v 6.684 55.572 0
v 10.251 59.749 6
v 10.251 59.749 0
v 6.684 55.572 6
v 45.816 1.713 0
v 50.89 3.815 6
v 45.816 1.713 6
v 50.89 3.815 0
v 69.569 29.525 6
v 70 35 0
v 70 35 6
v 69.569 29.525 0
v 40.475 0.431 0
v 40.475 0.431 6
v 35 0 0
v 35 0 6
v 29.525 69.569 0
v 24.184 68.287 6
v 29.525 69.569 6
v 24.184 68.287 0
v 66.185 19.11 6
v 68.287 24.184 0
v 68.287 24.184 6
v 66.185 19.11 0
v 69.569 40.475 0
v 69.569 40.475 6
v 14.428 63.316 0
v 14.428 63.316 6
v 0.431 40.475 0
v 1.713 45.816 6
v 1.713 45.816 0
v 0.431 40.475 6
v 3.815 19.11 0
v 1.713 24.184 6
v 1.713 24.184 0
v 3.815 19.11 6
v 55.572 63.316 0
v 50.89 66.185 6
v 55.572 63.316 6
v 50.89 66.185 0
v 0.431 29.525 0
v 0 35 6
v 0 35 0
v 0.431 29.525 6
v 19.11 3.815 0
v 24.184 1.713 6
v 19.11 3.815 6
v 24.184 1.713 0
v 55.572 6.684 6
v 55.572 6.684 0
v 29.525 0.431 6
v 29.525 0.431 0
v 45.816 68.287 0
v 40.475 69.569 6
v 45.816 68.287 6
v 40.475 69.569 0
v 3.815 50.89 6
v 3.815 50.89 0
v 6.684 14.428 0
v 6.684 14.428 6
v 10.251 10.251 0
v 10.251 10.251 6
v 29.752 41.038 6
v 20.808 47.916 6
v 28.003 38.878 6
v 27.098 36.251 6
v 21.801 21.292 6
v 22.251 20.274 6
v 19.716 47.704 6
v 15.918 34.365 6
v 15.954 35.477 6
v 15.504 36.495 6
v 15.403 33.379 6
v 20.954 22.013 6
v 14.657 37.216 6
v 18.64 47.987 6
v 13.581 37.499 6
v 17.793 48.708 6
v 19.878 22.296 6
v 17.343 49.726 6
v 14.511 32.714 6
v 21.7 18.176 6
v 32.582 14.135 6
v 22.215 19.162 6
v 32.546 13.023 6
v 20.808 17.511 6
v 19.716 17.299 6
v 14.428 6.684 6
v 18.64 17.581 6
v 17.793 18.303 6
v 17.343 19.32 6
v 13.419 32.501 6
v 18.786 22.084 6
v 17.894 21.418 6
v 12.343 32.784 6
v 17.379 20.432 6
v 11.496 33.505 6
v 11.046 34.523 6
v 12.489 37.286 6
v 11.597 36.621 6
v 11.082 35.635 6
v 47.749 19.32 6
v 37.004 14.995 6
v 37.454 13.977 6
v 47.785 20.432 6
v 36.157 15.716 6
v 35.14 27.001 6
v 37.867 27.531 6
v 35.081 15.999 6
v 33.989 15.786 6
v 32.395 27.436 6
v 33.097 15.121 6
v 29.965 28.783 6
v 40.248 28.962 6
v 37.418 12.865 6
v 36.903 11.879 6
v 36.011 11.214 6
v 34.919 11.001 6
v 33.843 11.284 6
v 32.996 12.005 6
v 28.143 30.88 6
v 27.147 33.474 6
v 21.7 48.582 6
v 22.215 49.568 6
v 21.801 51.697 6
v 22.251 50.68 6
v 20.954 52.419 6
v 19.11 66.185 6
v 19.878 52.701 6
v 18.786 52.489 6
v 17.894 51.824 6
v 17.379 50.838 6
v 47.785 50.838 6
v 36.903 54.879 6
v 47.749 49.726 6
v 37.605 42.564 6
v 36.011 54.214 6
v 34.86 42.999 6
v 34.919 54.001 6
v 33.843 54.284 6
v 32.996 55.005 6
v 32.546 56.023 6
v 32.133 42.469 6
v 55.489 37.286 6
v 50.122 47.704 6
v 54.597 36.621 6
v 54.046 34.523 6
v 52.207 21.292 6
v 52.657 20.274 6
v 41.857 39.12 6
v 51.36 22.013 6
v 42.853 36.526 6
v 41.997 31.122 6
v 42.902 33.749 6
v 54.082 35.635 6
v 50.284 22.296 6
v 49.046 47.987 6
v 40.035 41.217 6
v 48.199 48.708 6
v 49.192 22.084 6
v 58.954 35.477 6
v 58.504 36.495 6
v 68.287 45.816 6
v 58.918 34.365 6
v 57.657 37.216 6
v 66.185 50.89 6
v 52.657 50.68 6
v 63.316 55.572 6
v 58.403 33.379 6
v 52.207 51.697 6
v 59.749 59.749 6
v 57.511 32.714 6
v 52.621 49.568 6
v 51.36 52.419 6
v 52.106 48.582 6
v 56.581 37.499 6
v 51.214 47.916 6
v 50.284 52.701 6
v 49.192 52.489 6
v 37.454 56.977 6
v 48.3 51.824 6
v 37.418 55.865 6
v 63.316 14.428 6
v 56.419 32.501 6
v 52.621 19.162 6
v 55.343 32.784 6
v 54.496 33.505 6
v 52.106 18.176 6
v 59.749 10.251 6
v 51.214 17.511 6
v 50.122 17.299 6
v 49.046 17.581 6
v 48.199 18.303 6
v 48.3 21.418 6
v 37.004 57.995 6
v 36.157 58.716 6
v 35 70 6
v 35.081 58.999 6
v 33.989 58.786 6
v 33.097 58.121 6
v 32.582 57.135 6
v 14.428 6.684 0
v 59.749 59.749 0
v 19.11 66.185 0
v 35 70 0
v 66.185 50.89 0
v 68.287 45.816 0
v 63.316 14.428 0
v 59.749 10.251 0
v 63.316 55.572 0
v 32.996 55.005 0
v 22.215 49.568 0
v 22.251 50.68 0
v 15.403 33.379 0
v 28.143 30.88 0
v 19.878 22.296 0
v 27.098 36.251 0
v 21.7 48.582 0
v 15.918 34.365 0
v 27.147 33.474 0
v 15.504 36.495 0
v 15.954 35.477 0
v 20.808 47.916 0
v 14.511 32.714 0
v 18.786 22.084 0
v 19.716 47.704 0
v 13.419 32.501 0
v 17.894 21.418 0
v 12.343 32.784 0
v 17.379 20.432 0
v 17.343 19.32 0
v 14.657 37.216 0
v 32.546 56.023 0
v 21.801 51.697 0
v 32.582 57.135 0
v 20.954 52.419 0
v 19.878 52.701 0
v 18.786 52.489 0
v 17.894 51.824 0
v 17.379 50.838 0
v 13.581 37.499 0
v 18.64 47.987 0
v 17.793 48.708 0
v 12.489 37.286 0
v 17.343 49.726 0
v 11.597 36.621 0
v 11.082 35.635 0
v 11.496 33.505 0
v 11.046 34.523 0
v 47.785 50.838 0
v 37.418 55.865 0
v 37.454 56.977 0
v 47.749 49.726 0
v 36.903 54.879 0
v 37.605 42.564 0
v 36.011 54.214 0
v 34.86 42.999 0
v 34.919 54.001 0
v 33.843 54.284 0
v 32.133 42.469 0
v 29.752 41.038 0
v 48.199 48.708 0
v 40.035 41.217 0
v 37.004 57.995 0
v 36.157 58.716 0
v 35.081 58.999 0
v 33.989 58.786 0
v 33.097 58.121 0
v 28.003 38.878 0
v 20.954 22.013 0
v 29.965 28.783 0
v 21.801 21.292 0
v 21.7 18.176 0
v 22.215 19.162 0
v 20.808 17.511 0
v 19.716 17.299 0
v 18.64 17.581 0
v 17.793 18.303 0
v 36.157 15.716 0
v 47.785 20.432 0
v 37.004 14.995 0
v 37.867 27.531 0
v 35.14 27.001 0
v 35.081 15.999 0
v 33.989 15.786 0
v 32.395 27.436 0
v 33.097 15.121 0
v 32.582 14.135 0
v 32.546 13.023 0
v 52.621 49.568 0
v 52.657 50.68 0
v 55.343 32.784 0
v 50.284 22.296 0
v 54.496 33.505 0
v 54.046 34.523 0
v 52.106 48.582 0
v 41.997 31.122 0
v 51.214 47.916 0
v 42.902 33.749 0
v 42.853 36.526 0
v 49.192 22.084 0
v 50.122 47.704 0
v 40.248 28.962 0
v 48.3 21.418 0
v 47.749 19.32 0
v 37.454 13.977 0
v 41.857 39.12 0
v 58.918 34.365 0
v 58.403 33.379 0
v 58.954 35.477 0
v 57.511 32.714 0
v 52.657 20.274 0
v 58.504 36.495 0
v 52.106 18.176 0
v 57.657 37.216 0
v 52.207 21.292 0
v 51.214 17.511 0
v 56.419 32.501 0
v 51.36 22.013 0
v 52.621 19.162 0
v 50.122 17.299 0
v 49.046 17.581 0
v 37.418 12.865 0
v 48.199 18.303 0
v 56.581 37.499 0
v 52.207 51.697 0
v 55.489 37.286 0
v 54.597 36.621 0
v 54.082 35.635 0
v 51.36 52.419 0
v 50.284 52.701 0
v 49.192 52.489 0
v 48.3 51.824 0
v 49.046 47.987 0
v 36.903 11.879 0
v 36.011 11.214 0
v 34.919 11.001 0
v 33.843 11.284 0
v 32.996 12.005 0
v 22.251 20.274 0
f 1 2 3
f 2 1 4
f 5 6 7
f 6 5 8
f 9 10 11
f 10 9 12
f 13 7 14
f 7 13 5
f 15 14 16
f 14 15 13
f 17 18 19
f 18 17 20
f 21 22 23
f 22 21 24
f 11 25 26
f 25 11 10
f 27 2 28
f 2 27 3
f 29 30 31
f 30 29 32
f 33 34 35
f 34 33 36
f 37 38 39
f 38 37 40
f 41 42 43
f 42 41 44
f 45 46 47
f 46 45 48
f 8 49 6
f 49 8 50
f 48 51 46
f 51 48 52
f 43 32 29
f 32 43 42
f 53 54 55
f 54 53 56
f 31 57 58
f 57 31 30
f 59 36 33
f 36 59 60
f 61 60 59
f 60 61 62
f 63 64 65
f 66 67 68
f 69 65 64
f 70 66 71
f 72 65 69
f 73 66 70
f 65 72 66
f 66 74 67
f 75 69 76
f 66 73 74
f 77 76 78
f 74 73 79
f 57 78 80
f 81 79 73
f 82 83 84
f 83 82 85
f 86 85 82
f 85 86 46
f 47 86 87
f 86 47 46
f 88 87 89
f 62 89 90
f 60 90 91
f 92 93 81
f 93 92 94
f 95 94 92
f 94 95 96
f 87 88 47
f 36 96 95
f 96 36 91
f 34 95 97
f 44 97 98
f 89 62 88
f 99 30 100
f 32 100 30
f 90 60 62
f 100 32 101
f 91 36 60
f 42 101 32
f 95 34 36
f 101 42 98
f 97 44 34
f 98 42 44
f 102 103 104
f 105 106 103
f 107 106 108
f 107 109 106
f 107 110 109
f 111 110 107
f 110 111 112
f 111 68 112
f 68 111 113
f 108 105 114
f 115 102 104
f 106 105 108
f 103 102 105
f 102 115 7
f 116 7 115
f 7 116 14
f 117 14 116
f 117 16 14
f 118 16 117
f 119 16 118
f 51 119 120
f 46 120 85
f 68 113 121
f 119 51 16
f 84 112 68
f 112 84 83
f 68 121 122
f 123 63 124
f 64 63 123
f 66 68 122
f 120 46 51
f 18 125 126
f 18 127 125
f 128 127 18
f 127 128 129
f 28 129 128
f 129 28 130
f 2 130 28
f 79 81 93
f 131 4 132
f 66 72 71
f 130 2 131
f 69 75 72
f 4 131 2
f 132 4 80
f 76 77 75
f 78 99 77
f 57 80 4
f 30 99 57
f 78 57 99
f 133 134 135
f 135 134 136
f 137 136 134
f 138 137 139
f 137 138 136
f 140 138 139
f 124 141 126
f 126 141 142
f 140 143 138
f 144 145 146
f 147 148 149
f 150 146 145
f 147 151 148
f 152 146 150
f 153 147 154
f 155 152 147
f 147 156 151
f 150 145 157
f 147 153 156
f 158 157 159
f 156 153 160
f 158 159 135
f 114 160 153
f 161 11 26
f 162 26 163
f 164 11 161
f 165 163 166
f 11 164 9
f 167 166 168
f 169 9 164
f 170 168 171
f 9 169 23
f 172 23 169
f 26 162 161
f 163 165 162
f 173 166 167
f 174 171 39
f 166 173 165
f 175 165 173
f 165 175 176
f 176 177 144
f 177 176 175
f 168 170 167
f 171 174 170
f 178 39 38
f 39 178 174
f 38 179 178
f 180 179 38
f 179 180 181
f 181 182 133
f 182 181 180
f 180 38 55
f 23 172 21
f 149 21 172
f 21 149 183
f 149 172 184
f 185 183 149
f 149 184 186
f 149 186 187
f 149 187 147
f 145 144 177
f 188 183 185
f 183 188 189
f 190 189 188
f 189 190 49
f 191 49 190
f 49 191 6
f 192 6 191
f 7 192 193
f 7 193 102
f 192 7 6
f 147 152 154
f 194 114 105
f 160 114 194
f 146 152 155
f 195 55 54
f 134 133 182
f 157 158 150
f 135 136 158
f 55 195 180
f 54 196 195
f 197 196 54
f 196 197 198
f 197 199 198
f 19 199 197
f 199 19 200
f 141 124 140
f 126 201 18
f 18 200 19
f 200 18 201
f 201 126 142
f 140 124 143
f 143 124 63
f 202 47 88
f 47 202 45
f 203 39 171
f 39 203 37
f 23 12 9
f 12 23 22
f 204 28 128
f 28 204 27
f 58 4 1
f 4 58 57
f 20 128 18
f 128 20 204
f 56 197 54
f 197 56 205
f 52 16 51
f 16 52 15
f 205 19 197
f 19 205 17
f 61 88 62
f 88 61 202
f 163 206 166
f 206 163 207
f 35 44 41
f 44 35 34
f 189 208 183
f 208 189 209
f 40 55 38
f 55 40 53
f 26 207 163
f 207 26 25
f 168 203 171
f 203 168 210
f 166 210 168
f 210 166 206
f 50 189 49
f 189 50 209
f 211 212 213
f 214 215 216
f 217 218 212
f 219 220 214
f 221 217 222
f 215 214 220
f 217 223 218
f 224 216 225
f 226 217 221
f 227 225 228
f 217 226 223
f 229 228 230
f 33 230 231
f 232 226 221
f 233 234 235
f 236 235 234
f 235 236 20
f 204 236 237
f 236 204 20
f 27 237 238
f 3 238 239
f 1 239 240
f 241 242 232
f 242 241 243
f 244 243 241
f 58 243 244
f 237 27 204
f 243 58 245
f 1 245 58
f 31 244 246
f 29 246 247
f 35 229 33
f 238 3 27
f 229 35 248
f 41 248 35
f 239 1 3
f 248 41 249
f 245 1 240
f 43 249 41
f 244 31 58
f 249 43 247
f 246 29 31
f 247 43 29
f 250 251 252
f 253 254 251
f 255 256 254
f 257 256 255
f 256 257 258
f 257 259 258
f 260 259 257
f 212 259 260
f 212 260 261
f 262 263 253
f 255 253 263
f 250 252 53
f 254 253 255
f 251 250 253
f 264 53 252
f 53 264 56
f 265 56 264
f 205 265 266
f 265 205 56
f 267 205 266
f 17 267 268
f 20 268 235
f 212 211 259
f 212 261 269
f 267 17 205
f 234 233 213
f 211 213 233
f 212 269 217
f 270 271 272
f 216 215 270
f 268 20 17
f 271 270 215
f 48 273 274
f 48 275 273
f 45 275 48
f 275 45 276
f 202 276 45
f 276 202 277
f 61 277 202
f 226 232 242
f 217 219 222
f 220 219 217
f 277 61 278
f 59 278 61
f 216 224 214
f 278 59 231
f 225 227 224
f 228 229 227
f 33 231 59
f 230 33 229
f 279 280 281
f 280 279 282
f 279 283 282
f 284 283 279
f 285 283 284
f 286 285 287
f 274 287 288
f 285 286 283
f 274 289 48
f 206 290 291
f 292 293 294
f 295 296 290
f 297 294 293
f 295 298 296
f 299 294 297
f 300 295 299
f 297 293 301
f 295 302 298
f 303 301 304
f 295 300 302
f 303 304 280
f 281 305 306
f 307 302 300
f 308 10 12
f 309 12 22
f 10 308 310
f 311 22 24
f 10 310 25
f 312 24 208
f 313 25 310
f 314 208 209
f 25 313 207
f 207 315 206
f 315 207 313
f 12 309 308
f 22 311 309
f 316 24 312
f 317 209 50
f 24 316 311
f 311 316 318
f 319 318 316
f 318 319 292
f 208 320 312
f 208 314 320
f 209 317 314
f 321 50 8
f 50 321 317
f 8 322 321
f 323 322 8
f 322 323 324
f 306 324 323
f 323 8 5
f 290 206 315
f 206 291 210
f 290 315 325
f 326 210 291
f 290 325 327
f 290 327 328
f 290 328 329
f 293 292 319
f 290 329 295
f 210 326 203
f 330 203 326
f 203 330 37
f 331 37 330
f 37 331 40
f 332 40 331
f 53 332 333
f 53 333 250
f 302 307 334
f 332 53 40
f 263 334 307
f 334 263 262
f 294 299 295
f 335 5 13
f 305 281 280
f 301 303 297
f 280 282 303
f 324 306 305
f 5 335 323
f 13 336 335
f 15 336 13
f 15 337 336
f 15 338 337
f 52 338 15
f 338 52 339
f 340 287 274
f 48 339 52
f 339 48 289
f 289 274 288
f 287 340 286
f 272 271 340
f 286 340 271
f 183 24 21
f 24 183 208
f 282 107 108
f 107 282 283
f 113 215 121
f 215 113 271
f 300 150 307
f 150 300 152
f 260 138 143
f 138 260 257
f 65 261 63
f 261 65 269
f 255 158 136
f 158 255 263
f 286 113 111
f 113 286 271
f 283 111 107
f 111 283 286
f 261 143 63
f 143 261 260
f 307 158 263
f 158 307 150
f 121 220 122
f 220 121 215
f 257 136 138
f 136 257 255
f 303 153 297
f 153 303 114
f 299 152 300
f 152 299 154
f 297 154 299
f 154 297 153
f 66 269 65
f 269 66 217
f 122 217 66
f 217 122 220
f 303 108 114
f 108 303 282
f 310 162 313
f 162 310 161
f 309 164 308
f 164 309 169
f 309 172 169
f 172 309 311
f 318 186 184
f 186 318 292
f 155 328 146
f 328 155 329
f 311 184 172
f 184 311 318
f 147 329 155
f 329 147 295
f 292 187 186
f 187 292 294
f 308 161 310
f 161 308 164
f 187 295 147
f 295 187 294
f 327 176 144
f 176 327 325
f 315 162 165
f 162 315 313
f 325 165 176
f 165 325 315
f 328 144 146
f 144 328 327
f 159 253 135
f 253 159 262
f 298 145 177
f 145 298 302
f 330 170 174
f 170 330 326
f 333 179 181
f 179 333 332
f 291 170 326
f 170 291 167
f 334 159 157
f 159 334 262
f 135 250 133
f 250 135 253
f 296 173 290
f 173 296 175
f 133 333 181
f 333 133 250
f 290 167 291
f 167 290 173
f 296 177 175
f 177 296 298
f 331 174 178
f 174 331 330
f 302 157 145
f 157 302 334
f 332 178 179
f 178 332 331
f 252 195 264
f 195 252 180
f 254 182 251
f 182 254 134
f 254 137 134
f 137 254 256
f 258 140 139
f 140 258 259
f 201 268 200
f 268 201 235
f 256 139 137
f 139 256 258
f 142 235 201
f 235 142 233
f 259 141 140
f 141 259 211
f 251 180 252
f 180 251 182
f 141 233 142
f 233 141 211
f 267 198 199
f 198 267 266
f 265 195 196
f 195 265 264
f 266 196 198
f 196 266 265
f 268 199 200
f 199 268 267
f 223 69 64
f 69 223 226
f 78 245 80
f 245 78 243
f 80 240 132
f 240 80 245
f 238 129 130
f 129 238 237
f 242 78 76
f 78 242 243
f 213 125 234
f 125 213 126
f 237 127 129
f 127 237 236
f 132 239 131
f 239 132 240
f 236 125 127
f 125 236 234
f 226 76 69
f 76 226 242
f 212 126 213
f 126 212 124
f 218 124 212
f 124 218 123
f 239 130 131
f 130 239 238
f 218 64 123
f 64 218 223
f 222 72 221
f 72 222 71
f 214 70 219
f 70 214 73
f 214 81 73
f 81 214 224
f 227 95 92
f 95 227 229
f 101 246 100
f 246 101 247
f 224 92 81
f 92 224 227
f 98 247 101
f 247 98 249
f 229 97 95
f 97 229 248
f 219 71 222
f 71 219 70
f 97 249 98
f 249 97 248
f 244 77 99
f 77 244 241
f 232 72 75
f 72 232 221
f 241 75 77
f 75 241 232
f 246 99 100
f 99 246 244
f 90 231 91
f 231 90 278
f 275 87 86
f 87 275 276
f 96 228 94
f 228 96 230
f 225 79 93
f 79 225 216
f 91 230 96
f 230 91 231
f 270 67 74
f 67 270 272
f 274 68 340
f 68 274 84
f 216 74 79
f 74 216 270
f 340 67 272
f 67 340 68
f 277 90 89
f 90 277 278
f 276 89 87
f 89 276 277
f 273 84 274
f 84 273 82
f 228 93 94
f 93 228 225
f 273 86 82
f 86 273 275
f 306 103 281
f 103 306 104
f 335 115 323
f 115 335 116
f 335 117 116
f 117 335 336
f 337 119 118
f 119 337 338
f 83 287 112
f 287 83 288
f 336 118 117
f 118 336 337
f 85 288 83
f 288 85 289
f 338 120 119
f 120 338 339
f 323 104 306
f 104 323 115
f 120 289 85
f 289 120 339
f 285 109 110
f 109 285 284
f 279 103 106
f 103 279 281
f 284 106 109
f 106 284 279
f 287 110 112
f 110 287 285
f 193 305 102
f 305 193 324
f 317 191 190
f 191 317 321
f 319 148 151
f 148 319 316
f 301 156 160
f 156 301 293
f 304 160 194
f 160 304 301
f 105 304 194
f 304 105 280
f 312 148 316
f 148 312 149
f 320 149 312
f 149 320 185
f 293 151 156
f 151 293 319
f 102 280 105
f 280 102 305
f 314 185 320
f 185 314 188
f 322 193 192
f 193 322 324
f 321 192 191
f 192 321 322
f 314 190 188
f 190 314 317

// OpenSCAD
$fn = 32;

// ----------------------------------------------------------------------
// Spacer plate: round flange R35, 8 bolts
// ----------------------------------------------------------------------

// --- parameters (mm) ---
bore_r = 8;               // centre bore radius
bolt_r = 2.5;             // bolt hole radius
plate_t = 6;              // plate thickness, Z (extrusion height)
flange_r = 35;            // flange radius
n_bolt = 8;               // bolt hole count
ring_r = 21.5;            // bolt circle radius

profile = [[70, 35], [69.569, 40.475], [68.287, 45.816], [66.185, 50.89], [63.316, 55.572], [59.749, 59.749], [55.572, 63.316], [50.89, 66.185], [45.816, 68.287], [40.475, 69.569], [35, 70], [29.525, 69.569], [24.184, 68.287], [19.11, 66.185], [14.428, 63.316], [10.251, 59.749], [6.684, 55.572], [3.815, 50.89], [1.713, 45.816], [0.431, 40.475], [0, 35], [0.431, 29.525], [1.713, 24.184], [3.815, 19.11], [6.684, 14.428], [10.251, 10.251], [14.428, 6.684], [19.11, 3.815], [24.184, 1.713], [29.525, 0.431], [35, 0], [40.475, 0.431], [45.816, 1.713], [50.89, 3.815], [55.572, 6.684], [59.749, 10.251], [63.316, 14.428], [66.185, 19.11], [68.287, 24.184], [69.569, 29.525]];  // primary outline, 40 points, counter clockwise
void_1 = [[42.853, 36.526], [41.857, 39.12], [40.035, 41.217], [37.605, 42.564], [34.86, 42.999], [32.133, 42.469], [29.752, 41.038], [28.003, 38.878], [27.098, 36.251], [27.147, 33.474], [28.143, 30.88], [29.965, 28.783], [32.395, 27.436], [35.14, 27.001], [37.867, 27.531], [40.248, 28.962], [41.997, 31.122], [42.902, 33.749]];  // centre bore, 18 points
void_2 = [[58.954, 35.477], [58.504, 36.495], [57.657, 37.216], [56.581, 37.499], [55.489, 37.286], [54.597, 36.621], [54.082, 35.635], [54.046, 34.523], [54.496, 33.505], [55.343, 32.784], [56.419, 32.501], [57.511, 32.714], [58.403, 33.379], [58.918, 34.365]];  // bolt hole 1, 14 points
void_3 = [[52.657, 50.68], [52.207, 51.697], [51.36, 52.419], [50.284, 52.701], [49.192, 52.489], [48.3, 51.824], [47.785, 50.838], [47.749, 49.726], [48.199, 48.708], [49.046, 47.987], [50.122, 47.704], [51.214, 47.916], [52.106, 48.582], [52.621, 49.568]];  // bolt hole 2, 14 points
void_4 = [[37.454, 56.977], [37.004, 57.995], [36.157, 58.716], [35.081, 58.999], [33.989, 58.786], [33.097, 58.121], [32.582, 57.135], [32.546, 56.023], [32.996, 55.005], [33.843, 54.284], [34.919, 54.001], [36.011, 54.214], [36.903, 54.879], [37.418, 55.865]];  // bolt hole 3, 14 points
void_5 = [[22.251, 50.68], [21.801, 51.697], [20.954, 52.419], [19.878, 52.701], [18.786, 52.489], [17.894, 51.824], [17.379, 50.838], [17.343, 49.726], [17.793, 48.708], [18.64, 47.987], [19.716, 47.704], [20.808, 47.916], [21.7, 48.582], [22.215, 49.568]];  // bolt hole 4, 14 points
void_6 = [[15.954, 35.477], [15.504, 36.495], [14.657, 37.216], [13.581, 37.499], [12.489, 37.286], [11.597, 36.621], [11.082, 35.635], [11.046, 34.523], [11.496, 33.505], [12.343, 32.784], [13.419, 32.501], [14.511, 32.714], [15.403, 33.379], [15.918, 34.365]];  // bolt hole 5, 14 points
void_7 = [[22.251, 20.274], [21.801, 21.292], [20.954, 22.013], [19.878, 22.296], [18.786, 22.084], [17.894, 21.418], [17.379, 20.432], [17.343, 19.32], [17.793, 18.303], [18.64, 17.581], [19.716, 17.299], [20.808, 17.511], [21.7, 18.176], [22.215, 19.162]];  // bolt hole 6, 14 points
void_8 = [[37.454, 13.977], [37.004, 14.995], [36.157, 15.716], [35.081, 15.999], [33.989, 15.786], [33.097, 15.121], [32.582, 14.135], [32.546, 13.023], [32.996, 12.005], [33.843, 11.284], [34.919, 11.001], [36.011, 11.214], [36.903, 11.879], [37.418, 12.865]];  // bolt hole 7, 14 points
void_9 = [[52.657, 20.274], [52.207, 21.292], [51.36, 22.013], [50.284, 22.296], [49.192, 22.084], [48.3, 21.418], [47.785, 20.432], [47.749, 19.32], [48.199, 18.303], [49.046, 17.581], [50.122, 17.299], [51.214, 17.511], [52.106, 18.176], [52.621, 19.162]];  // bolt hole 8, 14 points

// --- the one profile operation ---
difference() {
  linear_extrude(height = plate_t) polygon(points = profile);
  translate([0, 0, -1])
    linear_extrude(height = plate_t + 2) polygon(points = void_1);
  translate([0, 0, -1])
    linear_extrude(height = plate_t + 2) polygon(points = void_2);
  translate([0, 0, -1])
    linear_extrude(height = plate_t + 2) polygon(points = void_3);
  translate([0, 0, -1])
    linear_extrude(height = plate_t + 2) polygon(points = void_4);
  translate([0, 0, -1])
    linear_extrude(height = plate_t + 2) polygon(points = void_5);
  translate([0, 0, -1])
    linear_extrude(height = plate_t + 2) polygon(points = void_6);
  translate([0, 0, -1])
    linear_extrude(height = plate_t + 2) polygon(points = void_7);
  translate([0, 0, -1])
    linear_extrude(height = plate_t + 2) polygon(points = void_8);
  translate([0, 0, -1])
    linear_extrude(height = plate_t + 2) polygon(points = void_9);
}
